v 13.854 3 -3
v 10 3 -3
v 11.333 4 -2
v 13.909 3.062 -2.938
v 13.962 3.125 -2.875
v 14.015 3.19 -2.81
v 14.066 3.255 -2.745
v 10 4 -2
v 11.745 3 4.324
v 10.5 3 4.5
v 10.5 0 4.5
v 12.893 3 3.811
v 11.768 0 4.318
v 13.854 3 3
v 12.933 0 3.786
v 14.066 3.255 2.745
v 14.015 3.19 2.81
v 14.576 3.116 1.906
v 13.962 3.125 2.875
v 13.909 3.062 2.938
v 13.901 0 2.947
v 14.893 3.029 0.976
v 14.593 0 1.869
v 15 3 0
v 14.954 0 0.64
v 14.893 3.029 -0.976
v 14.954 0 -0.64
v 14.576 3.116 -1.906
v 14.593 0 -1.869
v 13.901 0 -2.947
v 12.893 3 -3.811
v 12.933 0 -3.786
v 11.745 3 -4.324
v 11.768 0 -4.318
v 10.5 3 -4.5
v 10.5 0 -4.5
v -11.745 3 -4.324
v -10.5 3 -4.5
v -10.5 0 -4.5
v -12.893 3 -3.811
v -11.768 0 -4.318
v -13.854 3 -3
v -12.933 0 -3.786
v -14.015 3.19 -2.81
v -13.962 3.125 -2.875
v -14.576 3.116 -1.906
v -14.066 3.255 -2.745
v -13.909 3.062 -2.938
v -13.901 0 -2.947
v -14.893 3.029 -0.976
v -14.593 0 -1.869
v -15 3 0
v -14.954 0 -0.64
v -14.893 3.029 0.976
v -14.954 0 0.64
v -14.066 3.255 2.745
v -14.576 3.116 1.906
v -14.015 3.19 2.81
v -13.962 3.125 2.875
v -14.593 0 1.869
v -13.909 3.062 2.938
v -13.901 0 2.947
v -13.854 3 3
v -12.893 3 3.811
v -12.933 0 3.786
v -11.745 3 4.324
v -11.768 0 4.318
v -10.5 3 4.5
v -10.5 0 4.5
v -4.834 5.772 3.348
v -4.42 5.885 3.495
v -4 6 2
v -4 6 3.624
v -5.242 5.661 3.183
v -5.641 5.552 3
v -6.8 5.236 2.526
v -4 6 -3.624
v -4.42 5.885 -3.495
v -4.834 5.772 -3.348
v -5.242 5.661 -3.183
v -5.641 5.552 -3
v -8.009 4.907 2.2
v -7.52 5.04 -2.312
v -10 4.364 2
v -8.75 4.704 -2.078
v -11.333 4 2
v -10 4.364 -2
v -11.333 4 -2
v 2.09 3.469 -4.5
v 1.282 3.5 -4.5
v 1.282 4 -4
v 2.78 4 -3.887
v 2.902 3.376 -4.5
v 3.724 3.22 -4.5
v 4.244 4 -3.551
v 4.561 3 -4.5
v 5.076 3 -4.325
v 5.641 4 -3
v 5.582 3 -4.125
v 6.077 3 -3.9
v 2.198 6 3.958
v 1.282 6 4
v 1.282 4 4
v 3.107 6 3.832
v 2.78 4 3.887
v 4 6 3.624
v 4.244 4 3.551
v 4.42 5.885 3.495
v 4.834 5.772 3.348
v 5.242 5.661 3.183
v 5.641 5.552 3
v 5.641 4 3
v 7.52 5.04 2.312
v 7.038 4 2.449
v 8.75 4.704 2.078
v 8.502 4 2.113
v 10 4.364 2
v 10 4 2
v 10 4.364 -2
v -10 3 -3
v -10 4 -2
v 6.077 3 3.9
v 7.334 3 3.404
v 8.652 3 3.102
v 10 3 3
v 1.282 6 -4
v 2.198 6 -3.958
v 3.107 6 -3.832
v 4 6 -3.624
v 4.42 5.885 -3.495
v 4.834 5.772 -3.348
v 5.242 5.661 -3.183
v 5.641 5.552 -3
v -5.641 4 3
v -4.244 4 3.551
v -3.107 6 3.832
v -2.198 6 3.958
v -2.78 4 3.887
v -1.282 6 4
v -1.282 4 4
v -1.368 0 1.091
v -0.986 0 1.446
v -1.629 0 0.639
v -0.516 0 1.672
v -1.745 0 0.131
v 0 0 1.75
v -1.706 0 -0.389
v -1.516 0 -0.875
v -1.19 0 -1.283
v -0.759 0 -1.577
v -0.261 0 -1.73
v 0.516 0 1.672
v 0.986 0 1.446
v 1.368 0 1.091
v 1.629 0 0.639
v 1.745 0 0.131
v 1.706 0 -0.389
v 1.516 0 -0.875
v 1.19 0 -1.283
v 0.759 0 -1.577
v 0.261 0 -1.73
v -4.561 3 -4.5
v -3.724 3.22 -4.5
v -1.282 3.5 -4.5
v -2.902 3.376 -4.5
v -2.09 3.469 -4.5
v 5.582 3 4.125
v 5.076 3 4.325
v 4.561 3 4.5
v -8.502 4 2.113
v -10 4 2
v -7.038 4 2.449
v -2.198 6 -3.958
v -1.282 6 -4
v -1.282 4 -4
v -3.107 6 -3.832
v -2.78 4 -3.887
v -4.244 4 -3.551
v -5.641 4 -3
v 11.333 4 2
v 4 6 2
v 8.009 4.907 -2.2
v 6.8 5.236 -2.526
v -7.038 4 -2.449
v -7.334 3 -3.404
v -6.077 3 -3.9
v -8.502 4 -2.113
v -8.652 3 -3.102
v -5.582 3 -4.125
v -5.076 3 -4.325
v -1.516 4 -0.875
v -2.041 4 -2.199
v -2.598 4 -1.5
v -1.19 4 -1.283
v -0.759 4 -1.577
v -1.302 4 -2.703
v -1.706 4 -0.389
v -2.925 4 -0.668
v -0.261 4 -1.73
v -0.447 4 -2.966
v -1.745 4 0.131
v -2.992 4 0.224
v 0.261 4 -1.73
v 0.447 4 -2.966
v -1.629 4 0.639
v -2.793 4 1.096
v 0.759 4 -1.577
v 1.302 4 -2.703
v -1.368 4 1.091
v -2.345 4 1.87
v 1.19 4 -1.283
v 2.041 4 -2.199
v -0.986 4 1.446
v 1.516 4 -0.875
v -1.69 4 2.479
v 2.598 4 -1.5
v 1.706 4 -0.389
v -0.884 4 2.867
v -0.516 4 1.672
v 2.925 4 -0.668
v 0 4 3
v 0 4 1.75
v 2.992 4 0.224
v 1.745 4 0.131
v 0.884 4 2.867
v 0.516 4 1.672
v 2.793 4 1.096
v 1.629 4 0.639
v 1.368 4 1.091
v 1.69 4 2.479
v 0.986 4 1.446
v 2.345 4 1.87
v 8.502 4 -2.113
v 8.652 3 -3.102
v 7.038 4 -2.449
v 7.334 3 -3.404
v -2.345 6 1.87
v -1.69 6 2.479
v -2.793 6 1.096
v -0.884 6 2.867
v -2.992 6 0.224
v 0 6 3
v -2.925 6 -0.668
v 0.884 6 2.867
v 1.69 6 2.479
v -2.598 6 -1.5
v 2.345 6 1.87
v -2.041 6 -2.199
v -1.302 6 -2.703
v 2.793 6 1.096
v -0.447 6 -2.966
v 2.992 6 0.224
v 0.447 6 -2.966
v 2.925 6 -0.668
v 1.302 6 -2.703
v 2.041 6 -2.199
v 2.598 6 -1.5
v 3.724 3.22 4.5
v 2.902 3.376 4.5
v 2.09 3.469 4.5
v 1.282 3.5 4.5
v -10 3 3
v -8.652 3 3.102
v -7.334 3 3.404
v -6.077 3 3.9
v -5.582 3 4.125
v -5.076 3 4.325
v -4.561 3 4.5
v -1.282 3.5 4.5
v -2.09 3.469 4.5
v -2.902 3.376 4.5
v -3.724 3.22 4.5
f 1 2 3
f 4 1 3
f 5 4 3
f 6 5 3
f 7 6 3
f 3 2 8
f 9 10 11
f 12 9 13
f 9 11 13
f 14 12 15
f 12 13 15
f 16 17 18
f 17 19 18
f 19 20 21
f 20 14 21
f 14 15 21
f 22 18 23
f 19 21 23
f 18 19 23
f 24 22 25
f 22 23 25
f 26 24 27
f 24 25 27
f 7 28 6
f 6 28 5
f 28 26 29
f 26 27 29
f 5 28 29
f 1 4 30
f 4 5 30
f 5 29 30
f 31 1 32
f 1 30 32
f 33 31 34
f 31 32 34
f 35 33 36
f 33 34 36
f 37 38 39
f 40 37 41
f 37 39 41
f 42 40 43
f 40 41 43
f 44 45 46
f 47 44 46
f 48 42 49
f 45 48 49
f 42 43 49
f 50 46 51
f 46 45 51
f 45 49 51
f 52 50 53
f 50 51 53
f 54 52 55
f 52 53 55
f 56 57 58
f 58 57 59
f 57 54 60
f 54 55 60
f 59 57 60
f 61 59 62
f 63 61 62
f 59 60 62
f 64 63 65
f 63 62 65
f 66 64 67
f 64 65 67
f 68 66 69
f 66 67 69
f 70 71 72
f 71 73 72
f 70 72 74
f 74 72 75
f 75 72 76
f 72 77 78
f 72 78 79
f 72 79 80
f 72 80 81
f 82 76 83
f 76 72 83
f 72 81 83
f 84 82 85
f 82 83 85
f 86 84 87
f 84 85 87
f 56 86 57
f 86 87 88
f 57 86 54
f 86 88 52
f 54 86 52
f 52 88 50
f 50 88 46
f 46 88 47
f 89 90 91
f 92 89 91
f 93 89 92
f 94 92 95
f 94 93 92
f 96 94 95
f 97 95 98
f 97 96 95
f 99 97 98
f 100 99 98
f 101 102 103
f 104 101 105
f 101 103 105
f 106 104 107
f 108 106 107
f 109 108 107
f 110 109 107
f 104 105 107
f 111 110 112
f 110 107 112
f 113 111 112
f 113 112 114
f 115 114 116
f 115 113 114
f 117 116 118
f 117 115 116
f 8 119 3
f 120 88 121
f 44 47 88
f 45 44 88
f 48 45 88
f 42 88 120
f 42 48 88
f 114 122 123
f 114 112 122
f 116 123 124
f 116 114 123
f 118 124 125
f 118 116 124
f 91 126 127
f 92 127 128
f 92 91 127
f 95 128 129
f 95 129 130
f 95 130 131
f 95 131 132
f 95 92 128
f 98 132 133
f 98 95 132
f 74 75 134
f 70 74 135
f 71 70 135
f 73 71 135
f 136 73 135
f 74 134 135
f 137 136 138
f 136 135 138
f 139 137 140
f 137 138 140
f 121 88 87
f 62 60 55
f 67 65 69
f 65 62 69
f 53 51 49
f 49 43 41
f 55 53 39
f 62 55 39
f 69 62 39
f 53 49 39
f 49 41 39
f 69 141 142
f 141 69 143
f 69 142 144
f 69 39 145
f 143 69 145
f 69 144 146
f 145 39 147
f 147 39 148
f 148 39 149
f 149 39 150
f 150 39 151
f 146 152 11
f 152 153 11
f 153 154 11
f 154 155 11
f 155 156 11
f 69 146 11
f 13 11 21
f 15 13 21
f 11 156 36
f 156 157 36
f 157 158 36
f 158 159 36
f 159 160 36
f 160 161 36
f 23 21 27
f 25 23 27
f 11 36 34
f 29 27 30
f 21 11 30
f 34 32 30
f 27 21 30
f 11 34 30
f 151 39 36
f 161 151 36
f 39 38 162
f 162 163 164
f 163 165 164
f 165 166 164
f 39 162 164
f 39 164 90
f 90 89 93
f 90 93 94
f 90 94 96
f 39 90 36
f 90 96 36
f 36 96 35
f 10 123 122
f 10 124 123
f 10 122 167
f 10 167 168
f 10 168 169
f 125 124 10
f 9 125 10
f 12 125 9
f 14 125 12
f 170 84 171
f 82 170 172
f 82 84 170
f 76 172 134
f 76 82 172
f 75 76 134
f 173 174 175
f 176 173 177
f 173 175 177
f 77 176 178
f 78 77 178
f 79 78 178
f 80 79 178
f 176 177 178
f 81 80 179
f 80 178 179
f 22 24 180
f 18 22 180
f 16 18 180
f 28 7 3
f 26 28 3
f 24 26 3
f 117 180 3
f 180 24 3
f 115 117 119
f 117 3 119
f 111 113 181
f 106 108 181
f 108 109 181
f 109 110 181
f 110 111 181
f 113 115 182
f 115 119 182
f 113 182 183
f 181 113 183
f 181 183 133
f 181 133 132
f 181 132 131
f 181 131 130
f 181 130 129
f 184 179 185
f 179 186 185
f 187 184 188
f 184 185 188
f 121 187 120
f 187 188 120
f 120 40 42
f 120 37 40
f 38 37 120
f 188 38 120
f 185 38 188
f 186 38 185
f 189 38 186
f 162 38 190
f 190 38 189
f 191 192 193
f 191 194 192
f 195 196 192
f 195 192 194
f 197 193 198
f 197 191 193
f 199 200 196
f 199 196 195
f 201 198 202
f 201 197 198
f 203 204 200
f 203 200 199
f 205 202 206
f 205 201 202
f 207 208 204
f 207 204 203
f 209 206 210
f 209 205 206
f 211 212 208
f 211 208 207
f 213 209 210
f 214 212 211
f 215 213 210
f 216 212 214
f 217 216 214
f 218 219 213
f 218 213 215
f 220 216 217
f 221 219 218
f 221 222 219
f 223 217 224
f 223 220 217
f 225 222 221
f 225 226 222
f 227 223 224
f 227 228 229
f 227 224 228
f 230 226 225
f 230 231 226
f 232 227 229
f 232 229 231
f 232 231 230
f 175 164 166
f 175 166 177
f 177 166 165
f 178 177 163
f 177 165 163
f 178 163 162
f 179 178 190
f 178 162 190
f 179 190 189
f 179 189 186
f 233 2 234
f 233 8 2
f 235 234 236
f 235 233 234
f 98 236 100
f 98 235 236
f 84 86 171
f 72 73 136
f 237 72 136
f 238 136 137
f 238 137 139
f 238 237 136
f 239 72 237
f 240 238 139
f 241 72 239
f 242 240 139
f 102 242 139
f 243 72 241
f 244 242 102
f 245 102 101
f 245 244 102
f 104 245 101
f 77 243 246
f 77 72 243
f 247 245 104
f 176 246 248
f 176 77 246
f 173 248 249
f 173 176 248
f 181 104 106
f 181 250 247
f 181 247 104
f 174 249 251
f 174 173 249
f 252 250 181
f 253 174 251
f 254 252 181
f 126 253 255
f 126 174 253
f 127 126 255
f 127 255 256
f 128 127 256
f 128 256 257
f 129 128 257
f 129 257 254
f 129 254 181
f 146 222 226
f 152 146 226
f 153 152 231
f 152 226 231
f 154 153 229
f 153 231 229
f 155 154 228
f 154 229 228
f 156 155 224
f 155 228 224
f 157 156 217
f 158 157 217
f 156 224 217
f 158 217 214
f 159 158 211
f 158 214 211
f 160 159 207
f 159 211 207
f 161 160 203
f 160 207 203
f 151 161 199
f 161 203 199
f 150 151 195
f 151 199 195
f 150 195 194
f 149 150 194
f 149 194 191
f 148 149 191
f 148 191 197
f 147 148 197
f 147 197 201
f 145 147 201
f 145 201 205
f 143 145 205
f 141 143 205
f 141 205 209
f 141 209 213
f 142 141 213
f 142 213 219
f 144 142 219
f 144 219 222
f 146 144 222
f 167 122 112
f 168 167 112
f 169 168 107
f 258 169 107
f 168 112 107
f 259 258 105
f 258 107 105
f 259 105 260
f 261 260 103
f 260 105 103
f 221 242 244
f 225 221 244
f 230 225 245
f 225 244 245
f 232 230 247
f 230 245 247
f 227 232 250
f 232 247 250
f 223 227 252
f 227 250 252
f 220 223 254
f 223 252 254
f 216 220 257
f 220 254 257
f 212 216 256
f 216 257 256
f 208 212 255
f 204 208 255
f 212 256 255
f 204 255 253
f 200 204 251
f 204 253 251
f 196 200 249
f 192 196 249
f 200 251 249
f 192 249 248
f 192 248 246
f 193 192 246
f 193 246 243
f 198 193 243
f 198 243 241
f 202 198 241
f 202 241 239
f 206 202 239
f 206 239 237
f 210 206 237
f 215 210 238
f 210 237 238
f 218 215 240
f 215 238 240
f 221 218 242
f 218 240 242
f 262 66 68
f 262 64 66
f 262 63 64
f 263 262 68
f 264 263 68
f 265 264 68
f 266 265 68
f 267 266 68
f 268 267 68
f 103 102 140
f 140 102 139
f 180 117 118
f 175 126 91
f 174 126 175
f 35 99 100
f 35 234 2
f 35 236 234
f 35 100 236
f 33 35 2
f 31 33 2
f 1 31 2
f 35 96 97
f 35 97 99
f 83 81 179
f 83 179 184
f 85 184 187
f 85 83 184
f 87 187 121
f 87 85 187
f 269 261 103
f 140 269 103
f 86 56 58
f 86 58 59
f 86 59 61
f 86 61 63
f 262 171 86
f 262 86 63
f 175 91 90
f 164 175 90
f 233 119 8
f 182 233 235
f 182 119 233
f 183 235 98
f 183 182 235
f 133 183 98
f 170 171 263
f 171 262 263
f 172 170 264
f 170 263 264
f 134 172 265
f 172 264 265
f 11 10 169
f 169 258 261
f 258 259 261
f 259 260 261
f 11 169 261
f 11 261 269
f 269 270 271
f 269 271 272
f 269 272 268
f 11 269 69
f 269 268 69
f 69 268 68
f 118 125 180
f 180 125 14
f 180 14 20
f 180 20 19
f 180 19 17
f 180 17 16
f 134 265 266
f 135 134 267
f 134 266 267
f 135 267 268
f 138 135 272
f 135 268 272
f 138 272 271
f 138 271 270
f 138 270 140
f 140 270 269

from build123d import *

# Parameters (mm, degrees)
SKETCH1_W                = 30
SKETCH1_H                = 9
BOSS_EXTRUDE1_DEPTH      = 3
BOSS_EXTRUDE2_DEPTH      = 4
BOSS_EXTRUDE2_DEPTH_BACK = 4
SKETCH3_W                = 11
SKETCH3_H                = 2
CUT_EXTRUDE1_DEPTH       = 3
SKETCH5_R                = 1.75
CUT_EXTRUDE2_DEPTH       = 14
SKETCH6_R                = 3
CUT_EXTRUDE3_DEPTH       = 2
FILLET1_R                = 10
FILLET2_R                = 10
CHAMFER1_SIZE            = 1
FILLET3_R                = 4.5


with BuildPart() as part:
    # Sketch1 → Boss-Extrude1 (new body)
    with BuildSketch(Plane(origin=(0, 0, 0), x_dir=(1, 0, 0), z_dir=(0, 1, 0))):
        Rectangle(SKETCH1_W, SKETCH1_H)
    extrude(amount=BOSS_EXTRUDE1_DEPTH)

    # Sketch2 → Boss-Extrude2 (add, two sides: drawn at the far end of the back side and taken through both)
    with BuildSketch(Plane.XY.offset(-BOSS_EXTRUDE2_DEPTH_BACK)):
        Polygon((-15, 3), (-4, 6), (4, 6), (15, 3), align=None)
    extrude(amount=BOSS_EXTRUDE2_DEPTH + BOSS_EXTRUDE2_DEPTH_BACK)

    # Sketch3 → Cut-Extrude1 (cut)
    with BuildSketch(Plane(origin=(0, 6, 0), x_dir=(1, 0, 0), z_dir=(0, 1, 0))):
        with Locations((9.5, 3)):
            Rectangle(SKETCH3_W, SKETCH3_H)
        with Locations((-9.5, 3)):
            Rectangle(SKETCH3_W, SKETCH3_H)
        with Locations((-9.5, -3)):
            Rectangle(SKETCH3_W, SKETCH3_H)
        with Locations((9.5, -3)):
            Rectangle(SKETCH3_W, SKETCH3_H)
    extrude(amount=-CUT_EXTRUDE1_DEPTH, mode=Mode.SUBTRACT)

    # Sketch5 → Cut-Extrude2 (cut)
    with BuildSketch(Plane(origin=(0, 6, 0), x_dir=(1, 0, 0), z_dir=(0, 1, 0))):
        with Locations(Location((0, 0, 0), (0, 0, 270))):
            Circle(SKETCH5_R)
    extrude(amount=-CUT_EXTRUDE2_DEPTH, mode=Mode.SUBTRACT)

    # Sketch6 → Cut-Extrude3 (cut)
    with BuildSketch(Plane(origin=(0, 6, 0), x_dir=(1, 0, 0), z_dir=(0, 1, 0))):
        with Locations(Location((0, 0, 0), (0, 0, 270))):
            Circle(SKETCH6_R)
    extrude(amount=-CUT_EXTRUDE3_DEPTH, mode=Mode.SUBTRACT)

    # Fillet1
    # the kernel refuses this fillet: 10 mm, written as the material it adds along each edge
    with BuildSketch(Plane(origin=(-4, 21, -2), x_dir=(-1, 0, 0), z_dir=(0, -1, 0))) as fillet1_piece_1_section:
        with BuildLine():
            CenterArc((6, 10), FILLET1_R, 233.130102354, 36.869897646)
            Line((0, 2), (0, 0))
            Line((0, 0), (6, 0))
        make_face()
    fillet1_piece_1 = extrude(amount=18, mode=Mode.PRIVATE)
    fillet1_piece_1 = split(fillet1_piece_1, bisect_by=Plane(origin=(-0.192307692, 7.038461538, -2), z_dir=(0.2631174057921088, -0.9647638212377322, 0)), keep=Keep.TOP, mode=Mode.PRIVATE)
    add(fillet1_piece_1)
    with BuildSketch(Plane(origin=(4, 21, -2), x_dir=(0, 0, -1), z_dir=(0, -1, 0))) as fillet1_piece_2_section:
        with BuildLine():
            CenterArc((10, 6), FILLET1_R, 180, 36.869897646)
            Line((0, 6), (0, 0))
            Line((0, 0), (2, 0))
        make_face()
    fillet1_piece_2 = extrude(amount=18, mode=Mode.PRIVATE)
    fillet1_piece_2 = split(fillet1_piece_2, bisect_by=Plane(origin=(0.192307692, 7.038461538, -2), z_dir=(-0.2631174057921089, -0.9647638212377321, 0)), keep=Keep.TOP, mode=Mode.PRIVATE)
    add(fillet1_piece_2)
    with BuildSketch(Plane(origin=(4, 21, 2), x_dir=(1, 0, 0), z_dir=(0, -1, 0))) as fillet1_piece_3_section:
        with BuildLine():
            CenterArc((6, 10), FILLET1_R, 233.130102354, 36.869897646)
            Line((0, 2), (0, 0))
            Line((0, 0), (6, 0))
        make_face()
    fillet1_piece_3 = extrude(amount=18, mode=Mode.PRIVATE)
    fillet1_piece_3 = split(fillet1_piece_3, bisect_by=Plane(origin=(0.192307692, 7.038461538, 2), z_dir=(-0.2631174057921089, -0.9647638212377321, 0)), keep=Keep.TOP, mode=Mode.PRIVATE)
    add(fillet1_piece_3)
    with BuildSketch(Plane(origin=(-4, 21, 2), x_dir=(0, 0, 1), z_dir=(0, -1, 0))) as fillet1_piece_4_section:
        with BuildLine():
            CenterArc((10, 6), FILLET1_R, 180, 36.869897646)
            Line((0, 6), (0, 0))
            Line((0, 0), (2, 0))
        make_face()
    fillet1_piece_4 = extrude(amount=18, mode=Mode.PRIVATE)
    fillet1_piece_4 = split(fillet1_piece_4, bisect_by=Plane(origin=(-0.192307692, 7.038461538, 2), z_dir=(0.2631174057921088, -0.9647638212377322, 0)), keep=Keep.TOP, mode=Mode.PRIVATE)
    add(fillet1_piece_4)

    # Fillet2
    fillet2_edges = [part.edges().sort_by_distance(p)[0] for p in [
        (-4, 4.5, -4),
        (4, 4.5, -4),
        (4, 4.5, 4),
        (-4, 4.5, 4),
    ]]
    fillet(fillet2_edges, radius=FILLET2_R)

    # Chamfer1
    # the kernel refuses this chamfer: 1 mm, written as the material it adds along each edge
    with BuildSketch(Plane(origin=(1.282202113, 3, -4), x_dir=(0, 1, 0), z_dir=(-1, 0, 0))) as chamfer1_piece_1_section:
        Polygon((CHAMFER1_SIZE, 0), (0, CHAMFER1_SIZE), (0, 0), align=None)
    chamfer1_piece_1 = extrude(amount=2.564404226, mode=Mode.PRIVATE)
    chamfer1_piece_1 = split(chamfer1_piece_1, bisect_by=Plane(origin=(1.282202113, 3, -4.5), z_dir=(0, 0, 1)), keep=Keep.TOP, mode=Mode.PRIVATE)
    add(chamfer1_piece_1)
    with BuildSketch(Plane(origin=(10, 3, -12), x_dir=(0, 0, 1), z_dir=(1, 0, 0))) as chamfer1_piece_2:
        Polygon((10 - CHAMFER1_SIZE, 0), (10, -CHAMFER1_SIZE), (10, 0), align=None)
    revolve(axis=Axis((10, 3, -12), (0, -1, 0)), revolution_arc=25.841932763)
    with BuildSketch(Plane(origin=(1.282202113, 3, 4), x_dir=(0, 0, 1), z_dir=(-1, 0, 0))) as chamfer1_piece_3_section:
        Polygon((CHAMFER1_SIZE, 0), (0, CHAMFER1_SIZE), (0, 0), align=None)
    chamfer1_piece_3 = extrude(amount=2.564404226, mode=Mode.PRIVATE)
    chamfer1_piece_3 = split(chamfer1_piece_3, bisect_by=Plane(origin=(1.282202113, 3, 4.5), z_dir=(0, 0, -1)), keep=Keep.TOP, mode=Mode.PRIVATE)
    add(chamfer1_piece_3)
    with BuildSketch(Plane(origin=(-10, 3, 12), x_dir=(0, 0, -1), z_dir=(-1, 0, 0))) as chamfer1_piece_4:
        Polygon((10, -CHAMFER1_SIZE), (10 - CHAMFER1_SIZE, 0), (10, 0), align=None)
    revolve(axis=Axis((-10, 3, 12), (0, -1, 0)), revolution_arc=25.841932763)
    with BuildSketch(Plane(origin=(-1.282202113, 3, 6), x_dir=(0, 0, -1), z_dir=(1, 0, 0))) as chamfer1_piece_5_section:
        Polygon((10, CHAMFER1_SIZE), (10 + CHAMFER1_SIZE, 0), (10, 0), align=None)
    chamfer1_piece_5 = revolve(axis=Axis((-1.282202113, 3, 6), (0, 1, 0)), revolution_arc=25.841932763, mode=Mode.PRIVATE)
    chamfer1_piece_5 = split(chamfer1_piece_5, bisect_by=Plane(origin=(-1.282202113, 3, -4.5), z_dir=(0, 0, 1)), keep=Keep.TOP, mode=Mode.PRIVATE)
    add(chamfer1_piece_5)
    with BuildSketch(Plane(origin=(1.282202113, 3, 6), x_dir=(0, 0, -1), z_dir=(-1, 0, 0))) as chamfer1_piece_6_section:
        Polygon((10, -CHAMFER1_SIZE), (10 + CHAMFER1_SIZE, 0), (10, 0), align=None)
    chamfer1_piece_6 = revolve(axis=Axis((1.282202113, 3, 6), (0, -1, 0)), revolution_arc=25.841932763, mode=Mode.PRIVATE)
    chamfer1_piece_6 = split(chamfer1_piece_6, bisect_by=Plane(origin=(1.282202113, 3, -4.5), z_dir=(0, 0, 1)), keep=Keep.TOP, mode=Mode.PRIVATE)
    add(chamfer1_piece_6)
    with BuildSketch(Plane(origin=(1.282202113, 3, -6), x_dir=(0.43588989435406694, 0, 0.9000000000000001), z_dir=(0.9000000000000001, 0, -0.43588989435406694))) as chamfer1_piece_7_section:
        Polygon((10 + CHAMFER1_SIZE, 0), (10, -CHAMFER1_SIZE), (10, 0), align=None)
    chamfer1_piece_7 = revolve(axis=Axis((1.282202113, 3, -6), (0, -1, 0)), revolution_arc=25.841932763, mode=Mode.PRIVATE)
    chamfer1_piece_7 = split(chamfer1_piece_7, bisect_by=Plane(origin=(1.282202113, 3, 4.5), z_dir=(0, 0, -1)), keep=Keep.TOP, mode=Mode.PRIVATE)
    add(chamfer1_piece_7)
    with BuildSketch(Plane(origin=(-1.282202113, 3, -6), x_dir=(-0.4358898943539643, 0, 0.9000000000000499), z_dir=(-0.9000000000000499, 0, -0.4358898943539643))) as chamfer1_piece_8_section:
        Polygon((10, CHAMFER1_SIZE), (10 + CHAMFER1_SIZE, 0), (10, 0), align=None)
    chamfer1_piece_8 = revolve(axis=Axis((-1.282202113, 3, -6), (0, 1, 0)), revolution_arc=25.841932763, mode=Mode.PRIVATE)
    chamfer1_piece_8 = split(chamfer1_piece_8, bisect_by=Plane(origin=(-1.282202113, 3, 4.5), z_dir=(0, 0, -1)), keep=Keep.TOP, mode=Mode.PRIVATE)
    add(chamfer1_piece_8)
    with BuildSketch(Plane(origin=(-10, 3, 2), x_dir=(0, 1, 0), z_dir=(-1, 0, 0))) as chamfer1_piece_9_section:
        Polygon((CHAMFER1_SIZE, 0), (0, -CHAMFER1_SIZE), (0, 0), align=None)
    chamfer1_piece_9 = extrude(amount=5, mode=Mode.PRIVATE)
    chamfer1_piece_9 = split(chamfer1_piece_9, bisect_by=Plane(origin=(-10.346153846, 4.269230769, 2), z_dir=(0.2631174057919396, -0.9647638212377784, 0)), keep=Keep.TOP, mode=Mode.PRIVATE)
    add(chamfer1_piece_9)
    with BuildSketch(Plane(origin=(10, 3, -2), x_dir=(0, 0, -1), z_dir=(1, 0, 0))) as chamfer1_piece_10_section:
        Polygon((CHAMFER1_SIZE, 0), (0, CHAMFER1_SIZE), (0, 0), align=None)
    chamfer1_piece_10 = extrude(amount=5, mode=Mode.PRIVATE)
    chamfer1_piece_10 = split(chamfer1_piece_10, bisect_by=Plane(origin=(10.346153846, 4.269230769, -2), z_dir=(-0.2631174057919396, -0.9647638212377784, 0)), keep=Keep.TOP, mode=Mode.PRIVATE)
    add(chamfer1_piece_10)
    with BuildSketch(Plane(origin=(-15, 3, -2), x_dir=(0, 1, 0), z_dir=(1, 0, 0))) as chamfer1_piece_11_section:
        Polygon((CHAMFER1_SIZE, 0), (0, -CHAMFER1_SIZE), (0, 0), align=None)
    chamfer1_piece_11 = extrude(amount=5, mode=Mode.PRIVATE)
    chamfer1_piece_11 = split(chamfer1_piece_11, bisect_by=Plane(origin=(-15, 3, -2), z_dir=(0.2631174057919396, -0.9647638212377784, 0)), keep=Keep.TOP, mode=Mode.PRIVATE)
    add(chamfer1_piece_11)
    with BuildSketch(Plane(origin=(-10, 3, -12), x_dir=(0.43588989435406783, 0, 0.8999999999999998), z_dir=(0.8999999999999998, 0, -0.43588989435406783))) as chamfer1_piece_12:
        Polygon((10, -CHAMFER1_SIZE), (10 - CHAMFER1_SIZE, 0), (10, 0), align=None)
    revolve(axis=Axis((-10, 3, -12), (0, -1, 0)), revolution_arc=25.841932763)
    with BuildSketch(Plane(origin=(15, 3, 2), x_dir=(0, 0, 1), z_dir=(-1, 0, 0))) as chamfer1_piece_13_section:
        Polygon((CHAMFER1_SIZE, 0), (0, CHAMFER1_SIZE), (0, 0), align=None)
    chamfer1_piece_13 = extrude(amount=5, mode=Mode.PRIVATE)
    chamfer1_piece_13 = split(chamfer1_piece_13, bisect_by=Plane(origin=(15, 3, 2), z_dir=(-0.2631174057919396, -0.9647638212377784, 0)), keep=Keep.TOP, mode=Mode.PRIVATE)
    add(chamfer1_piece_13)
    with BuildSketch(Plane(origin=(10, 3, 12), x_dir=(-0.43588989435406783, 0, -0.8999999999999998), z_dir=(-0.8999999999999998, 0, 0.43588989435406783))) as chamfer1_piece_14:
        Polygon((10 - CHAMFER1_SIZE, 0), (10, -CHAMFER1_SIZE), (10, 0), align=None)
    revolve(axis=Axis((10, 3, 12), (0, -1, 0)), revolution_arc=25.841932763)

    # Fillet3
    # the kernel refuses this fillet: 4.5 mm, written as the material it takes off along each edge
    with BuildSketch(Plane(origin=(15, -11.25, -4.5), x_dir=(0, 0, 1), z_dir=(0, 1, 0)), Plane(origin=(-15, -11.25, -4.5), x_dir=(1, 0, 0), z_dir=(0, 1, 0))) as fillet3_piece_1:
        with BuildLine():
            CenterArc((FILLET3_R, -FILLET3_R), FILLET3_R, 90, 90)
            Line((0, -FILLET3_R), (0, 0))
            Line((0, 0), (FILLET3_R, 0))
        make_face()
    extrude(amount=25.5, mode=Mode.SUBTRACT)
    with BuildSketch(Plane(origin=(15, -11.25, 4.5), x_dir=(0, 0, -1), z_dir=(0, 1, 0)), Plane(origin=(-15, -11.25, 4.5), x_dir=(1, 0, 0), z_dir=(0, 1, 0))) as fillet3_piece_2:
        with BuildLine():
            CenterArc((FILLET3_R, FILLET3_R), FILLET3_R, 180, 90)
            Line((0, FILLET3_R), (0, 0))
            Line((0, 0), (FILLET3_R, 0))
        make_face()
    extrude(amount=25.5, mode=Mode.SUBTRACT)


solid = part.part
